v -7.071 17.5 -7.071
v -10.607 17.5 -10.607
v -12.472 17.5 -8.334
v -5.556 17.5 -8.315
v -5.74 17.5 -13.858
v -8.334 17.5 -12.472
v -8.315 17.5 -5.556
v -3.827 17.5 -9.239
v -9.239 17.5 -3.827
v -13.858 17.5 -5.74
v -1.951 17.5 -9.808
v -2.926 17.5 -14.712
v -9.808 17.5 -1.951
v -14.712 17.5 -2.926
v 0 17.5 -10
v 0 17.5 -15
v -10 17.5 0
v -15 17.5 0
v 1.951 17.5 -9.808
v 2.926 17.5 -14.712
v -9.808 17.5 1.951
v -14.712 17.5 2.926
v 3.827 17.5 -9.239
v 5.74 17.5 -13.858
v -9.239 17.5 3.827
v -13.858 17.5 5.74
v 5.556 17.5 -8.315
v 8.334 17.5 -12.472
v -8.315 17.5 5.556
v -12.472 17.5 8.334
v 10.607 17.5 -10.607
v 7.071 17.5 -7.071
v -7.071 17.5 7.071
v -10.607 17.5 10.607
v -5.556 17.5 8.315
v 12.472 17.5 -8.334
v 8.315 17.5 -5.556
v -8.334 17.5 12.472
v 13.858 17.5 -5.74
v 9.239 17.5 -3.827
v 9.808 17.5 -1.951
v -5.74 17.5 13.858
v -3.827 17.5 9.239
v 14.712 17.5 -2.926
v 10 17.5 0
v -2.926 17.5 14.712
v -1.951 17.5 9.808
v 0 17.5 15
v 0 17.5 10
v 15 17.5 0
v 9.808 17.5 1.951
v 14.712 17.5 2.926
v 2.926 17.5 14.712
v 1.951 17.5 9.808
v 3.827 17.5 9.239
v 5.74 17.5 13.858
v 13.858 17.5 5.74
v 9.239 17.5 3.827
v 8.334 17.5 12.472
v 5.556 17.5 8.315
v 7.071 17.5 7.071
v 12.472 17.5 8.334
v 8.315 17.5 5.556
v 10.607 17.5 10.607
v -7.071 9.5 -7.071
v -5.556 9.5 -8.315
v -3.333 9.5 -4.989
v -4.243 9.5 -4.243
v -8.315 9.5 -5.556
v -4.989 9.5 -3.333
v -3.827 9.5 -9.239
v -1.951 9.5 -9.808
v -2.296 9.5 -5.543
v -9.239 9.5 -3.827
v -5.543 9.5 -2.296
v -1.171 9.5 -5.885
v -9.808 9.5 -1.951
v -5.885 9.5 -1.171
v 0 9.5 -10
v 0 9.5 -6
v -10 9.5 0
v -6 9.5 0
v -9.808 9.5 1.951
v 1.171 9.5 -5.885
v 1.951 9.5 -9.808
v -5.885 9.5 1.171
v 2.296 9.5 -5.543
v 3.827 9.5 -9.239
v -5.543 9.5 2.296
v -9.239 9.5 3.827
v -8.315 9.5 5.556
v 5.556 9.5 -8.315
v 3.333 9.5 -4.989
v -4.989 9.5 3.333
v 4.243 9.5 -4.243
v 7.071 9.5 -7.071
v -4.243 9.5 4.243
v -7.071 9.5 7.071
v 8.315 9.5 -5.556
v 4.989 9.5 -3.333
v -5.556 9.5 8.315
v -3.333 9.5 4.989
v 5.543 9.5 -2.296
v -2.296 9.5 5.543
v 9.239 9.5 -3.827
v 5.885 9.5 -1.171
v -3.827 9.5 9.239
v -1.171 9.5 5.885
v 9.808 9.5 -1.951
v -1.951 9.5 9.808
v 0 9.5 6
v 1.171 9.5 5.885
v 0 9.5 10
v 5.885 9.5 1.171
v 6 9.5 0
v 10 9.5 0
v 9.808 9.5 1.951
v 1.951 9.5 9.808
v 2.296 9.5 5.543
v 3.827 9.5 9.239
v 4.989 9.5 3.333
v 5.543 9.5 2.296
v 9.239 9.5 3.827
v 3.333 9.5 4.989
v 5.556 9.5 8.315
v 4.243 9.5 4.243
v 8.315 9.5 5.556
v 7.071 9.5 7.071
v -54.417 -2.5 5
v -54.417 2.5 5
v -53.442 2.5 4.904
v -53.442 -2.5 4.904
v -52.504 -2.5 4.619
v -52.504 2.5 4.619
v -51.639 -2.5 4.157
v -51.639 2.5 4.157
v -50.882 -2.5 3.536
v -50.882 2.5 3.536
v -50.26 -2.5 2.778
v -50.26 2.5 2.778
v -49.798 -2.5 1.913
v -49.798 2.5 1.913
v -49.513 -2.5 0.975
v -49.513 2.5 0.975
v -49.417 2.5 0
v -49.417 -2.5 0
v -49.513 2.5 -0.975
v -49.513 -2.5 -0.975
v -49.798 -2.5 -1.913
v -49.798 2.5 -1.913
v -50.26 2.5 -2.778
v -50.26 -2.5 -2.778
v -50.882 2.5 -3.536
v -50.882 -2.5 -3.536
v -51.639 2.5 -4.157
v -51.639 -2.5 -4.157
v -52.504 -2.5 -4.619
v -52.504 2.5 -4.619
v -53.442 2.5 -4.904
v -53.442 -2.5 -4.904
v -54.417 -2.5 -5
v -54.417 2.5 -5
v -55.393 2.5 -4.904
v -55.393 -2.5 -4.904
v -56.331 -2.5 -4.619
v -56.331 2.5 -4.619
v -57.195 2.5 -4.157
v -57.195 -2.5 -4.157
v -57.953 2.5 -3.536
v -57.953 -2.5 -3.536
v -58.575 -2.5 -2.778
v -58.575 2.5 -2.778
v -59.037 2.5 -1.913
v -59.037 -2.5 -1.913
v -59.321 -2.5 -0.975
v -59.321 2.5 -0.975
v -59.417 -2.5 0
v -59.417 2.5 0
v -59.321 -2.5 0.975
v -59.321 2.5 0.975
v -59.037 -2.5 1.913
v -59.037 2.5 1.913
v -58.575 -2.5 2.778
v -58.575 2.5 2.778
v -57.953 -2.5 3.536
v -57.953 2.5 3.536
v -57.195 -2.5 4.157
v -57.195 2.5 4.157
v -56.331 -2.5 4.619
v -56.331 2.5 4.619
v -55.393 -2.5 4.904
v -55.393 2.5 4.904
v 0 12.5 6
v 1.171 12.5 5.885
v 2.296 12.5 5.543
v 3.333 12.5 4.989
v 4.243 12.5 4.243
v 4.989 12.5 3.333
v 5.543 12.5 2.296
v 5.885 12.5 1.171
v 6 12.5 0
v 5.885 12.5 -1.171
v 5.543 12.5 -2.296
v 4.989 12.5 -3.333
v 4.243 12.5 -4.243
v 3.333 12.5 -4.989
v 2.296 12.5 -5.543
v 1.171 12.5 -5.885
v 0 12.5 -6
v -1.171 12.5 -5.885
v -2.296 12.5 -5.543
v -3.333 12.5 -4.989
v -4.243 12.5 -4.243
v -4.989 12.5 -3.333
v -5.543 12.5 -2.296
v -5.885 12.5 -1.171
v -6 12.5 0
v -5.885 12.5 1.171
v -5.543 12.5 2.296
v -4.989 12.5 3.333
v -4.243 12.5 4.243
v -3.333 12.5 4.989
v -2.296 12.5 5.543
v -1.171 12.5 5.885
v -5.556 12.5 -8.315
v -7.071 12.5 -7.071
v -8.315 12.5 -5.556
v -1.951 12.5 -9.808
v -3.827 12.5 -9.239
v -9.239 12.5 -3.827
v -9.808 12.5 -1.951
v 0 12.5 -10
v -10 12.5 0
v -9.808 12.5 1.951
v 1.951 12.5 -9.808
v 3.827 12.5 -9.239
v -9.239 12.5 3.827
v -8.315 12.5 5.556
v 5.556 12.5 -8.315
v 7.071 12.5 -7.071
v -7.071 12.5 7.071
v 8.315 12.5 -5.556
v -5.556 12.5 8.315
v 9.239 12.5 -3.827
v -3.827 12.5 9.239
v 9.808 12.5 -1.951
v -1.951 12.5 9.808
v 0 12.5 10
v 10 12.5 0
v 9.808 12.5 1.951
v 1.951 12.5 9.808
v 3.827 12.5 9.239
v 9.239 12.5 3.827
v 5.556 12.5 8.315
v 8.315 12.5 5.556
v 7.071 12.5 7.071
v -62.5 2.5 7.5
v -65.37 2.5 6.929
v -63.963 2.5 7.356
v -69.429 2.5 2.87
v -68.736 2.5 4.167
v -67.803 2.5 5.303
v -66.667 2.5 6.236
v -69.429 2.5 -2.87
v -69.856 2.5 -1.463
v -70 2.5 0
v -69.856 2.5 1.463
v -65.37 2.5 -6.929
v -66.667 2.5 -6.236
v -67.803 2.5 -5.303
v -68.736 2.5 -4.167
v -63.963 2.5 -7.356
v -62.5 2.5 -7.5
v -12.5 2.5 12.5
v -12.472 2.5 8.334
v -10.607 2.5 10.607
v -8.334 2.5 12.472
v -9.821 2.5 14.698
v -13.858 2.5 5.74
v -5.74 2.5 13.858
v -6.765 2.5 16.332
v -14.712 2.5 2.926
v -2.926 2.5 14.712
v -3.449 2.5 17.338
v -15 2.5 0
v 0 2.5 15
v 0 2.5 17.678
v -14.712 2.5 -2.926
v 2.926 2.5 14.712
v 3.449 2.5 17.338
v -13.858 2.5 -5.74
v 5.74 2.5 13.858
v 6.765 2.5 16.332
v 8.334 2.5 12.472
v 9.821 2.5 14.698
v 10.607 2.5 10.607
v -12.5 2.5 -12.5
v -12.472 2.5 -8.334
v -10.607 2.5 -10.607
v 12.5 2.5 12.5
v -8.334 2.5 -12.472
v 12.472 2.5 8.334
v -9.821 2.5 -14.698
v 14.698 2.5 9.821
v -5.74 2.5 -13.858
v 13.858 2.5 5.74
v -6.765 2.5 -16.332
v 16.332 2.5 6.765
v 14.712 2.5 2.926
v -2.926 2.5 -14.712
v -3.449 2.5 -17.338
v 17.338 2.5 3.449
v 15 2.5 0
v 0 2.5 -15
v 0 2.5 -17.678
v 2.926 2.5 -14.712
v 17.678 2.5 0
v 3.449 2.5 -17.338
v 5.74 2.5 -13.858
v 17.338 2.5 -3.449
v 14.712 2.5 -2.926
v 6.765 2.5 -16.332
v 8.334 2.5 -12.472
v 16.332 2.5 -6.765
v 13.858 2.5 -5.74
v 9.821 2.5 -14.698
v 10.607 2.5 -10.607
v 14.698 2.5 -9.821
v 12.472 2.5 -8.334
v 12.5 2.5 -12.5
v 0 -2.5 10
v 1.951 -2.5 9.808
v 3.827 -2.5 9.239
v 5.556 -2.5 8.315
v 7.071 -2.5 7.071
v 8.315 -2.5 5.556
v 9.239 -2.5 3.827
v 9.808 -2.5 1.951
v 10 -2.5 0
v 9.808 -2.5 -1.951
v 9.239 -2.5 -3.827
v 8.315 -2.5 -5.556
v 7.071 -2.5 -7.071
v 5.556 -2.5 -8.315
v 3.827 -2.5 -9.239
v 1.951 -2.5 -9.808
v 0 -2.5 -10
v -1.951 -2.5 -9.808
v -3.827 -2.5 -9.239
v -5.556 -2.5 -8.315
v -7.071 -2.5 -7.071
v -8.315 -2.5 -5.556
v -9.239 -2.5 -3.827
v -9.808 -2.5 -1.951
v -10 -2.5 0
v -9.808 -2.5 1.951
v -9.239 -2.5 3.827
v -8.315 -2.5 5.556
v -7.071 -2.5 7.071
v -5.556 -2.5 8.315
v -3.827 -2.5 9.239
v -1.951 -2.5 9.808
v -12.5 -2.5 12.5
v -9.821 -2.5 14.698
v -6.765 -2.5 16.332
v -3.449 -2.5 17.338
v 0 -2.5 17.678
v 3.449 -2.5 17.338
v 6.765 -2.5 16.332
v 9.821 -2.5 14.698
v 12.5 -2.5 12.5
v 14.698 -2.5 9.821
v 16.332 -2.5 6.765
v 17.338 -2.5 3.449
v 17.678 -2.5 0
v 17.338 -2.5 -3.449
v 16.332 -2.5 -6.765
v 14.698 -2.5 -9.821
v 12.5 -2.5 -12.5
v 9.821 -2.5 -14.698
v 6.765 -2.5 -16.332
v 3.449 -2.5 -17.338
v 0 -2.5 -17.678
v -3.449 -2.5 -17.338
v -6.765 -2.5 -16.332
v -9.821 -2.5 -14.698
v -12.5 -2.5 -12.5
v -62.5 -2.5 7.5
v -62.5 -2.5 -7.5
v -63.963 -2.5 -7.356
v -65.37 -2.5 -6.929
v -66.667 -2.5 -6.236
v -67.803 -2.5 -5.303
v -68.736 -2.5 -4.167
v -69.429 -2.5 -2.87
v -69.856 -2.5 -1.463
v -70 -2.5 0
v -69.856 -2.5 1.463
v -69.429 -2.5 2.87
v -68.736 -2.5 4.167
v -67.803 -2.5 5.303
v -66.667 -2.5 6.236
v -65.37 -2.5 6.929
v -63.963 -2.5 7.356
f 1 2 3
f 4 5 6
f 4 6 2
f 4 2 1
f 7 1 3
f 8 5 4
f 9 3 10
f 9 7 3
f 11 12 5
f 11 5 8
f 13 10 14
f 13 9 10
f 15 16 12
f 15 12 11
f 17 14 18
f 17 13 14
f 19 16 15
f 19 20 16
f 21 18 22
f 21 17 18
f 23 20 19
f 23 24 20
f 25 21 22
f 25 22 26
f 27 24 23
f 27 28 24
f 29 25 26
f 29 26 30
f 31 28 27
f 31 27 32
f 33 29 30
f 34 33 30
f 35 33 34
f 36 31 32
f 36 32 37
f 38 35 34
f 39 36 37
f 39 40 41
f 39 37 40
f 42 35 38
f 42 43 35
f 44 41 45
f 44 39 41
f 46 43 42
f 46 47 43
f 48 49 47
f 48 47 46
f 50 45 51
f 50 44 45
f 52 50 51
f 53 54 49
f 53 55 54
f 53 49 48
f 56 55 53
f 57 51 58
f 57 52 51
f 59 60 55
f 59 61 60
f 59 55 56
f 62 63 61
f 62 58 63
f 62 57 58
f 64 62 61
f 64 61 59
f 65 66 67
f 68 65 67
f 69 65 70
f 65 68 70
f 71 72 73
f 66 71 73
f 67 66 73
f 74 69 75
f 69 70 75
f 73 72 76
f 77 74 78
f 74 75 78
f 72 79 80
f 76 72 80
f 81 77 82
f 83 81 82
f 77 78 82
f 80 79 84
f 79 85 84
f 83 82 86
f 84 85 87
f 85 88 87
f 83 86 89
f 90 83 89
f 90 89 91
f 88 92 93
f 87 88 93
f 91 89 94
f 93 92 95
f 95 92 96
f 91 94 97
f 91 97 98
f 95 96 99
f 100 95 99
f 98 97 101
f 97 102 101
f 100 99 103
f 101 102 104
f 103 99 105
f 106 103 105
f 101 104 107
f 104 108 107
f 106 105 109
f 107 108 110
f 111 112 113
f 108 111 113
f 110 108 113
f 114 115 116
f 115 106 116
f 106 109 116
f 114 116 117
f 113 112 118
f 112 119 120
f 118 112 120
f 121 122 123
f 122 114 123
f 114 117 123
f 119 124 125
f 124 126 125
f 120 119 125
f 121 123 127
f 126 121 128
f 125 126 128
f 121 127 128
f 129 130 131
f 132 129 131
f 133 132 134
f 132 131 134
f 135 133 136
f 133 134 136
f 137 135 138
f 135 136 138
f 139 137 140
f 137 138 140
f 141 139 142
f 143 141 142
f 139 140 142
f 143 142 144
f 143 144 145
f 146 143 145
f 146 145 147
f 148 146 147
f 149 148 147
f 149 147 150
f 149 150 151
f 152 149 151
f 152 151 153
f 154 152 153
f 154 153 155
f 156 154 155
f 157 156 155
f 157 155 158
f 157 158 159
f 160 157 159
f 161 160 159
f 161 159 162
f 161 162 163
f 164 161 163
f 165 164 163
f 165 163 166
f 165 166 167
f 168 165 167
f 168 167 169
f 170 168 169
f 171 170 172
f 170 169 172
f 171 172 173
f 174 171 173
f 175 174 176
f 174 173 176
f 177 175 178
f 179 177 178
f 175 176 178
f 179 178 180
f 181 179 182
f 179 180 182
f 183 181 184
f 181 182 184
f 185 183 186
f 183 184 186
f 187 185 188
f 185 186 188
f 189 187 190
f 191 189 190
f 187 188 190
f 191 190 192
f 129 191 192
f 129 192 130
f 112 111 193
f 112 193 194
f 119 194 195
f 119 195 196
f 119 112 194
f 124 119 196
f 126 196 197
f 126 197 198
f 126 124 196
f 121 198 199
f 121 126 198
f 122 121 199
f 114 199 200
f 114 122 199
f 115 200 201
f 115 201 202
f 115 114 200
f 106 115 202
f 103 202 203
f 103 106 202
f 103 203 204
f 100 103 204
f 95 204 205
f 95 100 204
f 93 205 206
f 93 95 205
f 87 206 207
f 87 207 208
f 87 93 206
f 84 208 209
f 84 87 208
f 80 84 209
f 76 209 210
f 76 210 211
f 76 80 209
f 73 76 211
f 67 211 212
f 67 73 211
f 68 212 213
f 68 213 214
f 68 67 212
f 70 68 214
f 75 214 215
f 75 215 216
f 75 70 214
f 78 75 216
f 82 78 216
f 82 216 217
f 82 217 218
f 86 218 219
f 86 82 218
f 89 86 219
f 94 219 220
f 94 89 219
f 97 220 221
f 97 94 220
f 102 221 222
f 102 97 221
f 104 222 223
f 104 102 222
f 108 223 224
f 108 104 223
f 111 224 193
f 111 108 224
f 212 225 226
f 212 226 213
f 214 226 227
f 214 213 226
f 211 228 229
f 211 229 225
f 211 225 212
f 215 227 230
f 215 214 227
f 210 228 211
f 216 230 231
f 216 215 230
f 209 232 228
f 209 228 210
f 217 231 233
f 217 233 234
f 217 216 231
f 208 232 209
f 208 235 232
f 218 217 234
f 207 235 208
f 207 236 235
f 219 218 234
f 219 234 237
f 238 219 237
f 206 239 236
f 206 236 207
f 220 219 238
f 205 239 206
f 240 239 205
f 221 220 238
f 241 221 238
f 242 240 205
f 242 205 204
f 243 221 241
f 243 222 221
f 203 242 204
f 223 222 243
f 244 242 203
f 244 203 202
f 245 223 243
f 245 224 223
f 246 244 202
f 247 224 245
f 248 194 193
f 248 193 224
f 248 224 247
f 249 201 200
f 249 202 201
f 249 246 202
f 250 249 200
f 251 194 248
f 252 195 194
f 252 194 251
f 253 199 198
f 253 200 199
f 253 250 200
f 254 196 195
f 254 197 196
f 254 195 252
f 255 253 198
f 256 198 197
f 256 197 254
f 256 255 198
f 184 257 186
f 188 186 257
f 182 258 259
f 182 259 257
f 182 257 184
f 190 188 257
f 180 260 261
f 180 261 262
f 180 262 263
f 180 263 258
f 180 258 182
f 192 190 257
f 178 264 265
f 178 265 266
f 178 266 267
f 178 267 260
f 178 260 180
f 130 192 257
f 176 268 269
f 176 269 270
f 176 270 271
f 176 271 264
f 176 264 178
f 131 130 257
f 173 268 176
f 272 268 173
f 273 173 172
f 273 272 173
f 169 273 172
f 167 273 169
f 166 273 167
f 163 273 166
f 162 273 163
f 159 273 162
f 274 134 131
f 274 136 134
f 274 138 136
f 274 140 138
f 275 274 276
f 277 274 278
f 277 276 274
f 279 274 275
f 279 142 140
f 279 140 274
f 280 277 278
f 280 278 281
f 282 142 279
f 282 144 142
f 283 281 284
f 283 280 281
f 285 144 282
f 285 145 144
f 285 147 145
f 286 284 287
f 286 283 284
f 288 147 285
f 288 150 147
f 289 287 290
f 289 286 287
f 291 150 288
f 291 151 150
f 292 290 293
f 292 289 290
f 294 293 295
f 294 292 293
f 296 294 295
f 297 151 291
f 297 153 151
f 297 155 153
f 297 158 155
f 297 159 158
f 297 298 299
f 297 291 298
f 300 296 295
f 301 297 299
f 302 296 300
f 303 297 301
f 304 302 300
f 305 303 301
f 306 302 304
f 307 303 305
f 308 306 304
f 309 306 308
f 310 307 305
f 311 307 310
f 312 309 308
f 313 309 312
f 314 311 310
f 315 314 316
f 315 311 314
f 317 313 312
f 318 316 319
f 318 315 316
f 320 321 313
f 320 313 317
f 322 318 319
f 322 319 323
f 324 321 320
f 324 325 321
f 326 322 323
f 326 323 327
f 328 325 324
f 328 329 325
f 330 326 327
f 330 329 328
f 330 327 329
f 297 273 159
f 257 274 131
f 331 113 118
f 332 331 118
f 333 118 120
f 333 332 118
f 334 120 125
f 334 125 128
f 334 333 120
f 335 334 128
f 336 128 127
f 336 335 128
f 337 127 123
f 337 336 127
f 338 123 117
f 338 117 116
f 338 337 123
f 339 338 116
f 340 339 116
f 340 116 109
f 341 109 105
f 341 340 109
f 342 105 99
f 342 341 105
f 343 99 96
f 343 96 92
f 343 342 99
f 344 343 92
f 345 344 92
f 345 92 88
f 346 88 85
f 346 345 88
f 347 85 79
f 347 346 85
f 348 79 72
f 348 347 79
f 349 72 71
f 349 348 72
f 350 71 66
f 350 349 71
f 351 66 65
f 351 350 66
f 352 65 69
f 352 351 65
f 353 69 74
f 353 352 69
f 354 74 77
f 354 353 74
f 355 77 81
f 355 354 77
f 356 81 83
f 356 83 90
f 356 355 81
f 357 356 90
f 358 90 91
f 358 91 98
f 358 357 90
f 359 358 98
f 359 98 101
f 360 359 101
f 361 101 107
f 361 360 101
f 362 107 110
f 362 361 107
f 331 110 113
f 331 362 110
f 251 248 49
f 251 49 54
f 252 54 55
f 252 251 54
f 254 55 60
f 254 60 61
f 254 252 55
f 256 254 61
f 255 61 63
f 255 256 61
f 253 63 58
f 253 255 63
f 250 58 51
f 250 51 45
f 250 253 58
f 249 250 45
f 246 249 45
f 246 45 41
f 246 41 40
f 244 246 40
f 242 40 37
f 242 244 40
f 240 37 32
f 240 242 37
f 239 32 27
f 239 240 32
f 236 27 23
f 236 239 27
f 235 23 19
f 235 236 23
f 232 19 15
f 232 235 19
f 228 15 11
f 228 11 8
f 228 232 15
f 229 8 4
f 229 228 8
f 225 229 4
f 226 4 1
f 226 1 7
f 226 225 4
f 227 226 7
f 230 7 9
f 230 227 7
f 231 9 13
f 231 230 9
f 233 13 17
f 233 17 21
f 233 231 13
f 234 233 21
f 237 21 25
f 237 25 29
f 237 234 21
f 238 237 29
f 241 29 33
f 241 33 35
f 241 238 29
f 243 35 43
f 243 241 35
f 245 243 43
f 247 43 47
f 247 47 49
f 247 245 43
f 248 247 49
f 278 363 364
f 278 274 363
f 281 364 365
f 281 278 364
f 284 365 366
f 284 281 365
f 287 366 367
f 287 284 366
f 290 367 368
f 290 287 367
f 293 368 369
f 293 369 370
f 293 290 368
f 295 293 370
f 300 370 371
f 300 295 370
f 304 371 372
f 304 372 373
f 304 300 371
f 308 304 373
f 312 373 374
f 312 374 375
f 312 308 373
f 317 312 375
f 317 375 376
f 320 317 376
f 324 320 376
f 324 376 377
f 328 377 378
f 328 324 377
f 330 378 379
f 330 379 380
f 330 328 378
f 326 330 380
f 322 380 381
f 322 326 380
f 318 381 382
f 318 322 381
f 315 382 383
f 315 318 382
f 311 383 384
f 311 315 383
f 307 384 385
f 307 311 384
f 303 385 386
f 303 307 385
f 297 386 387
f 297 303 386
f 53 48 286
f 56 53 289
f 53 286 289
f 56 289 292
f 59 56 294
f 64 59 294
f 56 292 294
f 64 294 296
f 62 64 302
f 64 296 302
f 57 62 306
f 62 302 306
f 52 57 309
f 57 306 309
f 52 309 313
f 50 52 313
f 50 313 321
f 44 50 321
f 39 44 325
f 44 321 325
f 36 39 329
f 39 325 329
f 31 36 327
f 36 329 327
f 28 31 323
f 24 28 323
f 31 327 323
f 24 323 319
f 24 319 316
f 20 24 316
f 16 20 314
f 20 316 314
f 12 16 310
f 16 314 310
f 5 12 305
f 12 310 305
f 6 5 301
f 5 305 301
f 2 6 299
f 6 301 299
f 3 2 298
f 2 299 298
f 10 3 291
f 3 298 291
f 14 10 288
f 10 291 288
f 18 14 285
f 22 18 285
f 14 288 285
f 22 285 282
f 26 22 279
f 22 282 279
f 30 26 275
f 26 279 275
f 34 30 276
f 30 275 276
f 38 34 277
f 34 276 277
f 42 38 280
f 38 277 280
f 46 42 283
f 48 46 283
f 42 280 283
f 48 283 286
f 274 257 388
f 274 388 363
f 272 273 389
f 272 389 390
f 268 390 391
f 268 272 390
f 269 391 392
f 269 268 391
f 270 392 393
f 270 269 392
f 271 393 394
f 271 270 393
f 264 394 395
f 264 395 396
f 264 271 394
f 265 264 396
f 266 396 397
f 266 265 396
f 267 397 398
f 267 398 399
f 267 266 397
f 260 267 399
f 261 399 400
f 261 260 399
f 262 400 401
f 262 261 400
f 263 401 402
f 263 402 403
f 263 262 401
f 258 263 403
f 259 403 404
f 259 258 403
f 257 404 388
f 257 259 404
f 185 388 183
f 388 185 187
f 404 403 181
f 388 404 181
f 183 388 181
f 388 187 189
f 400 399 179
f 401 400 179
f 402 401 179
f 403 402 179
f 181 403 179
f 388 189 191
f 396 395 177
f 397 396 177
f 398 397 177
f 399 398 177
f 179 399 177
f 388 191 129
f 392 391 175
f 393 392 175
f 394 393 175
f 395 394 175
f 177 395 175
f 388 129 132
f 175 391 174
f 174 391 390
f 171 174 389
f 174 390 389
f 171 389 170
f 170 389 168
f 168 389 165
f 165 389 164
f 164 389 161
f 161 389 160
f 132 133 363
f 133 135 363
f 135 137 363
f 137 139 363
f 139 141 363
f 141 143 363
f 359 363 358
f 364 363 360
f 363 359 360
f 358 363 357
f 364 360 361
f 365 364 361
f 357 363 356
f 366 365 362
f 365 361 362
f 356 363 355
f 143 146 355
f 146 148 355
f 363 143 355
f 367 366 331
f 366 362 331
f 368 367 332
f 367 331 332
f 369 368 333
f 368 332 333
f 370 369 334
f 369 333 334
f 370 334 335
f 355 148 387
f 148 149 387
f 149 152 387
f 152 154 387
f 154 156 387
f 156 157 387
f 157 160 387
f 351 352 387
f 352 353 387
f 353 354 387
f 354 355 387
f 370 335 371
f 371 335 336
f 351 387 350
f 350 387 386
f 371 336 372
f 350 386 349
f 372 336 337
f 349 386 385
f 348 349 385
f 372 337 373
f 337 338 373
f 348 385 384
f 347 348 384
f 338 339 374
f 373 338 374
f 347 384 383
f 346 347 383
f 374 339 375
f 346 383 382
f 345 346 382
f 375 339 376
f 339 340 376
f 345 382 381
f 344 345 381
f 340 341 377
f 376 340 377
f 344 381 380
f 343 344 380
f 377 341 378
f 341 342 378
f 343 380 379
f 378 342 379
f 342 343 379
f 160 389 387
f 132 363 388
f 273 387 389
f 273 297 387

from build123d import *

# Parameters (mm, degrees)
SKETCH1_R           = 10
BOSS_EXTRUDE1_DEPTH = 2.5
SKETCH2_R           = 15
SKETCH2_R_2         = 10
BOSS_EXTRUDE2_DEPTH = 15
SKETCH3_R           = 5
CUT_EXTRUDE1_DEPTH  = 74.739406019
BOSS_EXTRUDE3_START = 9.5
SKETCH4_R           = 10
SKETCH4_R_2         = 6
BOSS_EXTRUDE3_DEPTH = 3


with BuildPart() as part:
    # Sketch1 → Boss-Extrude1 (new, symmetric)
    with BuildSketch(Plane(origin=(0, 0, 0), x_dir=(1, 0, 0), z_dir=(0, 1, 0))):
        with BuildLine():
            Line((-12.5, 12.5), (-62.5, 7.5))
            ThreePointArc((-62.5, 7.5), (-70, 0), (-62.5, -7.5))
            Line((-62.5, -7.5), (-12.5, -12.5))
            ThreePointArc((-12.5, -12.5), (17.67766953, 0), (-12.5, 12.5))
        make_face()
        with Locations(Location((0, 0, 0), (0, 0, 270))):
            Circle(SKETCH1_R, mode=Mode.SUBTRACT)
    extrude(amount=BOSS_EXTRUDE1_DEPTH, both=True)

    # Sketch2 → Boss-Extrude2 (add)
    with BuildSketch(Plane(origin=(0, 2.5, 0), x_dir=(1, 0, 0), z_dir=(0, 1, 0))):
        with Locations(Location((0, 0, 0), (0, 0, 270))):
            Circle(SKETCH2_R)
        with Locations(Location((0, 0, 0), (0, 0, 270))):
            Circle(SKETCH2_R_2, mode=Mode.SUBTRACT)
    extrude(amount=BOSS_EXTRUDE2_DEPTH)

    # Sketch3 → Cut-Extrude1 (cut, through all)
    with BuildSketch(Plane(origin=(0, 2.5, 0), x_dir=(1, 0, 0), z_dir=(0, 1, 0))):
        with Locations(Location((-54.417236445, 0, 0), (0, 0, 270))):
            Circle(SKETCH3_R)
    extrude(amount=-CUT_EXTRUDE1_DEPTH, mode=Mode.SUBTRACT)

    # Sketch4 → Boss-Extrude3 (add)
    with BuildSketch(Plane(origin=(0, 0, 0), x_dir=(1, 0, 0), z_dir=(0, 1, 0)).offset(BOSS_EXTRUDE3_START)):
        with Locations(Location((0, 0, 0), (0, 0, 270))):
            Circle(SKETCH4_R)
        with Locations(Location((0, 0, 0), (0, 0, 270))):
            Circle(SKETCH4_R_2, mode=Mode.SUBTRACT)
    extrude(amount=BOSS_EXTRUDE3_DEPTH)


solid = part.part
